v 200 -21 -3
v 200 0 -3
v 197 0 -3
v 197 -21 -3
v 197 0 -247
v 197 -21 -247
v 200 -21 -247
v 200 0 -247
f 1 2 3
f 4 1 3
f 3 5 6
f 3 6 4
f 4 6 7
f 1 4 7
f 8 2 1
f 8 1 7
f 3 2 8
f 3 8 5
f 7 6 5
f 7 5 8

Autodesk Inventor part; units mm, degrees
ref_plane "YZ Plane" through (0, 0, 0) normal (1, 0, 0) x (0, 1, 0)
ref_plane "XZ Plane" through (0, 0, 0) normal (0, 1, 0) x (-1, 0, 0)
ref_plane "XY Plane" through (0, 0, 0) normal (0, 0, 1) x (1, 0, 0)
sketch "block" plane through (0, 0, 0) normal (0, 1, 0) x (-1, 0, 0)
  line L0 (0, 0) -> (-200, 0)
  line L1 (-200, 0) -> (-200, -250)
  line L2 (-200, -250) -> (0, -250)
  line L3 (0, -250) -> (0, 0)
  dimension "d31" = 200
  dimension "d32" = 250
extrude "ext_block" add sketch "block" against normal blind 24
shell "Shell2" thickness 3 removed faces 0
sketch "lines_base" plane through (0, 0, 0) normal (0, 1, 0) x (-1, 0, 0)
  line L0 (0, 0) -> (-200, 0)
  line L1 (-200, 0) -> (-200, -250)
  line L2 (-200, -250) -> (0, -250)
  line L3 (0, -250) -> (0, 0)
  circle A0 centre (-65, -60) radius 6
  circle A1 centre (-125, -80) radius 6
  circle A2 centre (-65, -60) radius 12.5
  circle A3 centre (-65, -60) radius 8.5
  circle A4 centre (-125, -80) radius 8.5
  circle A5 centre (-125, -80) radius 12.5
  circle A6 centre (-175, -125) radius 3
  line L4 (-175, -125) -> (-175, -209)
  line L5 (-175, -125) -> (-91, -125) construction
  circle A7 centre (-175, -139) radius 3
  circle A8 centre (-175, -153) radius 3
  circle A9 centre (-175, -167) radius 3
  circle A10 centre (-175, -181) radius 3
  circle A11 centre (-175, -195) radius 3
  circle A12 centre (-175, -209) radius 3
  circle A13 centre (-95, -185) radius 2.5
  circle A14 centre (-95, -185) radius 5
  point P0 (-200, -125)
  dimension "d0" = 200
  dimension "d1" = 250
  dimension "d2" = 12
  dimension "d3" = 12
  dimension "d4" = 25
  dimension "d5" = 17
  dimension "d6" = 17
  dimension "d7" = 25
  dimension "d8" = 75
  dimension "d9" = 80
  dimension "d10" = 65
  dimension "d11" = 60
  dimension "d12" = 6
  dimension "d13" = 84
  dimension "d14" = 90
  dimension "d15" = 25
  dimension "d16" = 125
  dimension "d19" = 14
  dimension "d24" = 5
  dimension "d25" = 10
  dimension "d26" = 65
  dimension "d27" = 95
extrude "holes" cut sketch "lines_base" against normal up to surface (3 mm away) contours A0 | A1 | A6 | A7 L4 | L4 A7 | A8 L4 | L4 A8 | A9 L4 | L4 A9 | A10 L4 | L4 A10 | A11 L4 | L4 A11 | A12 | A13
sketch "Sketch4" plane through (200, 0, -250) normal (0, 0, -1) x (-1, 0, 0)
  line L0 (188, -4) -> (169, -4)
  line L1 (169, -4) -> (169, -17)
  line L2 (169, -17) -> (188, -17)
  line L3 (188, -17) -> (188, -4)
  line L4 (0, 0) -> (200, 0) projected
  line L5 (200, 0) -> (200, -24) projected
  dimension "d40" = 19
  dimension "d41" = 13
  dimension "d42" = 4
  dimension "d43" = 12
extrude "pwr_button_hole" cut sketch "Sketch4" against normal up to surface (3 mm away)
ref_plane "Work Plane1" through (7, -21, -243) normal (0, 1, 0) x (1, 0, 0)
sketch "Sketch5" plane through (7, -21, -243) normal (0, 1, 0) x (1, 0, 0)
  line L0 (-20.9366, 21.7948) -> (229.9216, 21.7948)
  line L1 (229.9216, 21.7948) -> (229.9216, -260.9184)
  line L2 (229.9216, -260.9184) -> (-20.9366, -260.9184)
  line L3 (-20.9366, -260.9184) -> (-20.9366, 21.7948)
  point P0 (-7, -243)
extrude "back_cover_cut" cut sketch "Sketch5" against normal through all
sketch "Sketch10" plane through (197, -3, -3) normal (0, 0, -1) x (-1, 0, 0)
  line L0 (-36.7403, 38.8931) -> (239.3233, 38.8931)
  line L1 (239.3233, 38.8931) -> (239.3233, -48.8023)
  line L2 (239.3233, -48.8023) -> (-36.7403, -48.8023)
  line L3 (-36.7403, -48.8023) -> (-36.7403, 38.8931)
  point P0 (197, 3)
extrude "Extrusion8" cut sketch "Sketch10" against normal blind 10
sketch "Sketch11" plane through (3, -3, -247) normal (0, 0, 1) x (1, 0, 0)
  line L0 (-15.7564, 16.4959) -> (212.749, 16.4959)
  line L1 (212.749, 16.4959) -> (212.749, -33.4204)
  line L2 (212.749, -33.4204) -> (-15.7564, -33.4204)
  line L3 (-15.7564, -33.4204) -> (-15.7564, 16.4959)
  point P0 (-3, 3)
extrude "Extrusion9" cut sketch "Sketch11" against normal blind 10
sketch "Sketch12" plane through (197, -21, -3) normal (-1, 0, 0) x (0, 0, 1)
  line L0 (-265.2535, 43.7396) -> (74.9163, 43.7396)
  line L1 (74.9163, 43.7396) -> (74.9163, -33.9078)
  line L2 (74.9163, -33.9078) -> (-265.2535, -33.9078)
  line L3 (-265.2535, -33.9078) -> (-265.2535, 43.7396)
  point P0 (3, 21)
extrude "Extrusion10" cut sketch "Sketch12" along normal through all
properties part number "back_botton" material "Glass"
